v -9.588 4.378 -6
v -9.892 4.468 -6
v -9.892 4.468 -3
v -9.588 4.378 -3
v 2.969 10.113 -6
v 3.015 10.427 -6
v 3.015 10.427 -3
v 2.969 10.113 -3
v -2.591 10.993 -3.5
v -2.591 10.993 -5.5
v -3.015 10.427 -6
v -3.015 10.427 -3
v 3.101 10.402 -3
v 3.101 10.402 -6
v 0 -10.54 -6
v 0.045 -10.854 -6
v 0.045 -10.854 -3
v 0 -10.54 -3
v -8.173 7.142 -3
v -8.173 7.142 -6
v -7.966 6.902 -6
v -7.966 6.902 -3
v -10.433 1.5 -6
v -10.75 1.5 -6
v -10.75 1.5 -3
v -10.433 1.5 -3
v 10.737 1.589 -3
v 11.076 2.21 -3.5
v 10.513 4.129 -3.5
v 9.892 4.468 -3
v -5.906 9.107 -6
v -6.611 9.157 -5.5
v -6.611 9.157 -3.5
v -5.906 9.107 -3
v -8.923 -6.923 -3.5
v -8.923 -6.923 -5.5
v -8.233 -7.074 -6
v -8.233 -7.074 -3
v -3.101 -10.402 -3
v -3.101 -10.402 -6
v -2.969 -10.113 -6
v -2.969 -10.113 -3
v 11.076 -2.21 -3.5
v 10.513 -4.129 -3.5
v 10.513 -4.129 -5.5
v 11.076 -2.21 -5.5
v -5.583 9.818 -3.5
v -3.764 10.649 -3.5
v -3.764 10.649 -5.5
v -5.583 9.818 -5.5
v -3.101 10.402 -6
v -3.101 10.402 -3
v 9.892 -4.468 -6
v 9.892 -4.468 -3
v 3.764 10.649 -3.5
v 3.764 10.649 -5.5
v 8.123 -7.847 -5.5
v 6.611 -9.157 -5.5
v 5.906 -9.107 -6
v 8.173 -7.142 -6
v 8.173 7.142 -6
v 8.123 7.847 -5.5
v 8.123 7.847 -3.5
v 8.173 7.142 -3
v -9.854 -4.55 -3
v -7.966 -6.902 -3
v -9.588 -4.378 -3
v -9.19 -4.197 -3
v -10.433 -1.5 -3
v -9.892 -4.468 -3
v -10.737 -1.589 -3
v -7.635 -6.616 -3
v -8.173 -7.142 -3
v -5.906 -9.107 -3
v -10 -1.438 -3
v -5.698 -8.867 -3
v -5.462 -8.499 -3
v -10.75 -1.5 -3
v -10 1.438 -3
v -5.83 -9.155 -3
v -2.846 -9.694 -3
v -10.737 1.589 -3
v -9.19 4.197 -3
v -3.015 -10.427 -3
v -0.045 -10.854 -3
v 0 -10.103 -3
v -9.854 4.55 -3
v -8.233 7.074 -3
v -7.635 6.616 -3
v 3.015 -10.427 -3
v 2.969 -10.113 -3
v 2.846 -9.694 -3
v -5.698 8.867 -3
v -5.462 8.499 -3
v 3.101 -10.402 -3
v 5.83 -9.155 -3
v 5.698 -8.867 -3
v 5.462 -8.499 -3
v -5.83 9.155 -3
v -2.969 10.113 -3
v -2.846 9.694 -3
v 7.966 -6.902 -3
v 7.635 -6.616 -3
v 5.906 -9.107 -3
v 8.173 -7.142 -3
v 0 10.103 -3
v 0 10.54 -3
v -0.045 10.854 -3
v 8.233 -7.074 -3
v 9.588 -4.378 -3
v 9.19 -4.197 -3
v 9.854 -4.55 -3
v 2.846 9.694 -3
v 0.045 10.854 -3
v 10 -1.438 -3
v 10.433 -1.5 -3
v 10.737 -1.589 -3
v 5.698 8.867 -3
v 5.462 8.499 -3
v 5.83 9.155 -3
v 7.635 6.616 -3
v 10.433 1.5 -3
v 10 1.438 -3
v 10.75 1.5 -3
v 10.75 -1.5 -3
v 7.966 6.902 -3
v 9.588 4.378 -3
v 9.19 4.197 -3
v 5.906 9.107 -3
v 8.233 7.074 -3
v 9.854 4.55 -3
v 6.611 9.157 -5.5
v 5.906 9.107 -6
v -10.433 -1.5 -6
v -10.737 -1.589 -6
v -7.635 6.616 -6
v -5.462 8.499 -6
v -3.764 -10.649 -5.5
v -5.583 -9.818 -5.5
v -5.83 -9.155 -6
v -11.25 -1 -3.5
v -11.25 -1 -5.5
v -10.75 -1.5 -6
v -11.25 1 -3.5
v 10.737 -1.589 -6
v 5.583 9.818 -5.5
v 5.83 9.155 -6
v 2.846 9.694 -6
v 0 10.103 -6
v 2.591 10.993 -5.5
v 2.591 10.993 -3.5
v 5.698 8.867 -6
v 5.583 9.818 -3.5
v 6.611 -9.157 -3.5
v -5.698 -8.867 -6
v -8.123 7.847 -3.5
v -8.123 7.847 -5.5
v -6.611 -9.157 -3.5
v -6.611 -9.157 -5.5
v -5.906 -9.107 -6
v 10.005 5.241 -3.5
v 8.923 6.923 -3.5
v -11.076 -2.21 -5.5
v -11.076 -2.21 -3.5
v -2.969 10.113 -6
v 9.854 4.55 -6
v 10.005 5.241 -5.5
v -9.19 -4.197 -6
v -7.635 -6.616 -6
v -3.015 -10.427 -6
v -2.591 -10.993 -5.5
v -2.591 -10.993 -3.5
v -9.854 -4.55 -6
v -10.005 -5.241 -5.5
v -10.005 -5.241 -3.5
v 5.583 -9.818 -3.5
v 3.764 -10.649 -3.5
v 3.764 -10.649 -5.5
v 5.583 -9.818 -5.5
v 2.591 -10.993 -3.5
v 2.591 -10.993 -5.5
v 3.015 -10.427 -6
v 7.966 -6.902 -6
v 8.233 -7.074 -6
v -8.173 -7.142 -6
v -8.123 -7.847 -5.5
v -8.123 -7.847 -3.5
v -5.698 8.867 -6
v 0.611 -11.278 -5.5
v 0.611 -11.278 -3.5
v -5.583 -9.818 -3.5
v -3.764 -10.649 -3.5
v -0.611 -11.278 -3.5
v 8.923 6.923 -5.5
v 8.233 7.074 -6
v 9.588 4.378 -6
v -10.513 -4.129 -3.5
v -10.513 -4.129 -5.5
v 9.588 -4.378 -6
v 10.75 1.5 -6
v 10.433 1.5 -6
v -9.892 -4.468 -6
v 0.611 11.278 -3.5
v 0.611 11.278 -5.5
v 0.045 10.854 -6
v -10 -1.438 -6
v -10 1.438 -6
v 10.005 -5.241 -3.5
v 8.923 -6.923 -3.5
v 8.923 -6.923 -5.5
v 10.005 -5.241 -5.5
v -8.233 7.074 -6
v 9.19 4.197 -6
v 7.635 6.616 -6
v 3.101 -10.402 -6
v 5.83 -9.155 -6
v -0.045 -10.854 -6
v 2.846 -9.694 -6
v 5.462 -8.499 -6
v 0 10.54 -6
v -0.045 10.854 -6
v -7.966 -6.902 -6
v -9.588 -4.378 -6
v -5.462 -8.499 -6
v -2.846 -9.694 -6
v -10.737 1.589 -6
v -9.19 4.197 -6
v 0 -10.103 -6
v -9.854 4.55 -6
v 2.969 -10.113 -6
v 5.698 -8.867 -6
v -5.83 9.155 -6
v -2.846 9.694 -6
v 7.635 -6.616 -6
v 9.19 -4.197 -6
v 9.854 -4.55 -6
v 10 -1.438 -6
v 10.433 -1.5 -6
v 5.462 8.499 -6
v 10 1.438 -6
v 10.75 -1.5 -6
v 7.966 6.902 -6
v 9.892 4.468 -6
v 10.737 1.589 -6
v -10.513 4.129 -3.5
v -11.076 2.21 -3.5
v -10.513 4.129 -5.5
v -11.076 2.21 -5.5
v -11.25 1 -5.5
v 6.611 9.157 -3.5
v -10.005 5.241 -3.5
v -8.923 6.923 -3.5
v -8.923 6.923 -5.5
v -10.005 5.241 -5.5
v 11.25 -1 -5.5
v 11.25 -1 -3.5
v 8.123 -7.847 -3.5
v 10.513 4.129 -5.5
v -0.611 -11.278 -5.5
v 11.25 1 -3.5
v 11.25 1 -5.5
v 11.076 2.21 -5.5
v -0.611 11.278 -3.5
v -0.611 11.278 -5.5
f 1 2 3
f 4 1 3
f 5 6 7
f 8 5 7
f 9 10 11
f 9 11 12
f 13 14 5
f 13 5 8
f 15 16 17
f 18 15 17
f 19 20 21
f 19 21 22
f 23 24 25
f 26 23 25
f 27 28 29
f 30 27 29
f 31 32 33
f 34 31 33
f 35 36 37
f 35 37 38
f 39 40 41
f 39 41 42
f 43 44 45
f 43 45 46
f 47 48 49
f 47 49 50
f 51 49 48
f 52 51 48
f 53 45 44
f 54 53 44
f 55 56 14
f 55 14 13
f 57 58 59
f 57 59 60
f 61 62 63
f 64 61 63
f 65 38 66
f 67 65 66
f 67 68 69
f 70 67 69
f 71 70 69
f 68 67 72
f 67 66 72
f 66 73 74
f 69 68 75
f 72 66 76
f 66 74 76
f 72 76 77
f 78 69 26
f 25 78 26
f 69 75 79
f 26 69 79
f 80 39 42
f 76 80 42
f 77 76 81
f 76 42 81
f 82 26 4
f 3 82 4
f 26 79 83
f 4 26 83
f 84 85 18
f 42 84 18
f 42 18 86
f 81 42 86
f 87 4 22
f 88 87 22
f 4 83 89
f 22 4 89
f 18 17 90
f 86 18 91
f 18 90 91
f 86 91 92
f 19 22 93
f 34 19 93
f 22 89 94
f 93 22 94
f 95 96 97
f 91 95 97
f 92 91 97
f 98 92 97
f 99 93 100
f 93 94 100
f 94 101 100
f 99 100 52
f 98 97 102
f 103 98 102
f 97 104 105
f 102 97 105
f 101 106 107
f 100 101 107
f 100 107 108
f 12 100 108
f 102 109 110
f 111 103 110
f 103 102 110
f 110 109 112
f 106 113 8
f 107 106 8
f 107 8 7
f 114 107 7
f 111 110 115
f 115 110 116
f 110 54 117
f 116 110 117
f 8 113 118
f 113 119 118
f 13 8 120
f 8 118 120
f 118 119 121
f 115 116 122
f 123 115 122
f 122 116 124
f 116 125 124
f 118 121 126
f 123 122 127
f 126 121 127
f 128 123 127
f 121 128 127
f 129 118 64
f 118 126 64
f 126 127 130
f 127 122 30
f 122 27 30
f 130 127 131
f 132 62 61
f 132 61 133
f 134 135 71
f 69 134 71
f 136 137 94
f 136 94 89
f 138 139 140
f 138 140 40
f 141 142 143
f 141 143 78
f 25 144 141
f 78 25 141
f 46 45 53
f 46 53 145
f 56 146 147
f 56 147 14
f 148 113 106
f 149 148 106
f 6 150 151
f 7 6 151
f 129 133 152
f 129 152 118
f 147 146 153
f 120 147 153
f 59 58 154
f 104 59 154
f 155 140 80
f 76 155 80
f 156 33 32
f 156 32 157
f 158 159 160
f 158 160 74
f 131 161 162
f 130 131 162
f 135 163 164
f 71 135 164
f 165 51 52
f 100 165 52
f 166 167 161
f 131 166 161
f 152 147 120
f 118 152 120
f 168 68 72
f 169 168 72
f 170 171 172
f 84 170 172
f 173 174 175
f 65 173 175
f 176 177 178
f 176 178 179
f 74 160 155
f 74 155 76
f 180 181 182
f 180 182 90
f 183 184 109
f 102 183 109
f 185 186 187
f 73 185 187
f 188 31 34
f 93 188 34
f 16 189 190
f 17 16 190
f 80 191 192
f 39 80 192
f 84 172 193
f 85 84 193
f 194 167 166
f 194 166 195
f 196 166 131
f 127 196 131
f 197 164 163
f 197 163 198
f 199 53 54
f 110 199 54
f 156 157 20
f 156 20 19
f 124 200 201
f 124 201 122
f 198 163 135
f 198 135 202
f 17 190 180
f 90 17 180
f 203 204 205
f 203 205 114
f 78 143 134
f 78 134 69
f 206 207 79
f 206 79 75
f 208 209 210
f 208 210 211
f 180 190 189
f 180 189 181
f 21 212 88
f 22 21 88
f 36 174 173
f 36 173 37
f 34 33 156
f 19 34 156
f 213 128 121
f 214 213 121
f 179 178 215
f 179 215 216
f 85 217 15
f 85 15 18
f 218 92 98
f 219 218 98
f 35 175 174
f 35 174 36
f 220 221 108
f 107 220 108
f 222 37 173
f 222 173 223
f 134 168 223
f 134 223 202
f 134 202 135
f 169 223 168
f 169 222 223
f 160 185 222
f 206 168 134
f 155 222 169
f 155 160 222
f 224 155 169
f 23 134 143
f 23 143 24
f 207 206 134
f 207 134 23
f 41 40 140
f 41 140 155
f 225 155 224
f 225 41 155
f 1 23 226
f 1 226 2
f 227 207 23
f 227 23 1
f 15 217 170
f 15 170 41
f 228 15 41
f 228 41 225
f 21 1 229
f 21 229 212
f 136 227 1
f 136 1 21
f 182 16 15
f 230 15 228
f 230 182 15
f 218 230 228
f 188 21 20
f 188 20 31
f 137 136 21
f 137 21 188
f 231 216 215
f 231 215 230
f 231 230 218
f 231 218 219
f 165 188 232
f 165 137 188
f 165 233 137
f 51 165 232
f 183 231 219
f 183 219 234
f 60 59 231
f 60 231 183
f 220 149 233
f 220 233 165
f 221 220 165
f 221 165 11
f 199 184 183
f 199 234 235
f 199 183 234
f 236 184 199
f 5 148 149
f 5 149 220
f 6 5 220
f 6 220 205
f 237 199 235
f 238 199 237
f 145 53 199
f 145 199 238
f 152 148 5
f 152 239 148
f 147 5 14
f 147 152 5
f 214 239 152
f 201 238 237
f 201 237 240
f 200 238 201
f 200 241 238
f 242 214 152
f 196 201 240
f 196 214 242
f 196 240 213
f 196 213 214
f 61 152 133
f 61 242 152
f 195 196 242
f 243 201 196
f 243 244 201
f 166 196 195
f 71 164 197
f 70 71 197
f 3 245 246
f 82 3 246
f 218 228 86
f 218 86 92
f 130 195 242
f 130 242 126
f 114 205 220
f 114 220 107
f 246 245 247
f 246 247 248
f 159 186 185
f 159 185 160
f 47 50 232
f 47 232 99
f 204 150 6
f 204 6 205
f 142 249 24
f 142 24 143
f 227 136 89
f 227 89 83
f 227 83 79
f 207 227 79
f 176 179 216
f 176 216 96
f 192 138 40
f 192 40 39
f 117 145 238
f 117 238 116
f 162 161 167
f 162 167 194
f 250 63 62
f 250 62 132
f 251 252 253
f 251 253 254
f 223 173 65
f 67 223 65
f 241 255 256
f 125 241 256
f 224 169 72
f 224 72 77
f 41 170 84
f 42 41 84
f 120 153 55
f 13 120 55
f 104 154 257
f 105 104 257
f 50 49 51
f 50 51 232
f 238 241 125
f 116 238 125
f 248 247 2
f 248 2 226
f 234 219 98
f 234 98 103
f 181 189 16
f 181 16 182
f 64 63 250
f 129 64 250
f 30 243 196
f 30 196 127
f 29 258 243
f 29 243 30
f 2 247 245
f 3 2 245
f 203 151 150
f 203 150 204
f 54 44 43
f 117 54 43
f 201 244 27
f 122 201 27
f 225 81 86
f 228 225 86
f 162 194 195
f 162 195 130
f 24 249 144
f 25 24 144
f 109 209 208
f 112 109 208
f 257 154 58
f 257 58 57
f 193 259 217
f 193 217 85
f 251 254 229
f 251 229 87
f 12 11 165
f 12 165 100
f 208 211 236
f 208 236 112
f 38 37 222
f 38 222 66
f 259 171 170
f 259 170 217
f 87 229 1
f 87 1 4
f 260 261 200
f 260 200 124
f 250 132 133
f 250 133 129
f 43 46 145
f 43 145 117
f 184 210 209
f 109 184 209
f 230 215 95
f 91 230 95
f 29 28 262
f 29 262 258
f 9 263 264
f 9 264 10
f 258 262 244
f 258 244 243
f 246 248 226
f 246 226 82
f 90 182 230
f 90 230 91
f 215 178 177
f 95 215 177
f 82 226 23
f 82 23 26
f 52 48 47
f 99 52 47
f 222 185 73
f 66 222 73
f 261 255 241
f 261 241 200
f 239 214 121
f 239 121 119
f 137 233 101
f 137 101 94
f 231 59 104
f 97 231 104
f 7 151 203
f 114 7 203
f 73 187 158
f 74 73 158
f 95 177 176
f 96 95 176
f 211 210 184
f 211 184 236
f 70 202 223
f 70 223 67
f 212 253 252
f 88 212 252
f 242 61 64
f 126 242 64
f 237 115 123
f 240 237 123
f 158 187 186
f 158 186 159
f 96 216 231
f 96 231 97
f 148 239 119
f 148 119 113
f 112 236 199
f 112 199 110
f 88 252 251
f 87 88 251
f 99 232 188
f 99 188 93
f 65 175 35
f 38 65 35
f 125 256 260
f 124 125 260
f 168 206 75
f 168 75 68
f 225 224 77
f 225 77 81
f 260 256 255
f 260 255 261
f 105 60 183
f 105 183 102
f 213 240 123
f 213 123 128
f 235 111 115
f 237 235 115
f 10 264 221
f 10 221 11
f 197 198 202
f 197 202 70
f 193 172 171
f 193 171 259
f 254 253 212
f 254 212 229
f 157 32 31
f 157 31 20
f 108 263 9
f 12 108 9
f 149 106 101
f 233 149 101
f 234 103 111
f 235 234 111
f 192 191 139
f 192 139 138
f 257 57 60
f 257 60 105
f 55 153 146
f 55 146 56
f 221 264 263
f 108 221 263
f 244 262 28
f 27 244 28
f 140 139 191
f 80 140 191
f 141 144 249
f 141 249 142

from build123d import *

# Parameters (mm, degrees)
SKETCH006_W           = 3
SKETCH006_H           = 3
PAD001_DEPTH          = 1.25
CHAMFER_SIZE          = 0.5
POLARPATTERN001_COUNT = 22


with BuildPart() as part:
    # Sketch006 → Pad001 (new body)
    with BuildSketch(Plane.YZ.offset(11.25)):
        with Locations((0, -4.5)):
            Rectangle(SKETCH006_W, SKETCH006_H)
    extrude(amount=-PAD001_DEPTH)

    # Chamfer
    chamfer_edges = [part.edges().sort_by_distance(p)[0] for p in [
        (11.25, 1.5, -4.5),
        (11.25, 0, -3),
        (11.25, -1.5, -4.5),
        (11.25, 0, -6),
    ]]
    chamfer(chamfer_edges, length=CHAMFER_SIZE)

    # PolarPattern001: part ×22 about axis
    polarpattern001_axis = Axis((0, 0, 0), (0, 0, 1))


with BuildPart() as part_1:
    add(part.part)
    for i in range(1, POLARPATTERN001_COUNT):
        add(part.part.rotate(polarpattern001_axis, i * 360 / POLARPATTERN001_COUNT))


solid = part_1.part
